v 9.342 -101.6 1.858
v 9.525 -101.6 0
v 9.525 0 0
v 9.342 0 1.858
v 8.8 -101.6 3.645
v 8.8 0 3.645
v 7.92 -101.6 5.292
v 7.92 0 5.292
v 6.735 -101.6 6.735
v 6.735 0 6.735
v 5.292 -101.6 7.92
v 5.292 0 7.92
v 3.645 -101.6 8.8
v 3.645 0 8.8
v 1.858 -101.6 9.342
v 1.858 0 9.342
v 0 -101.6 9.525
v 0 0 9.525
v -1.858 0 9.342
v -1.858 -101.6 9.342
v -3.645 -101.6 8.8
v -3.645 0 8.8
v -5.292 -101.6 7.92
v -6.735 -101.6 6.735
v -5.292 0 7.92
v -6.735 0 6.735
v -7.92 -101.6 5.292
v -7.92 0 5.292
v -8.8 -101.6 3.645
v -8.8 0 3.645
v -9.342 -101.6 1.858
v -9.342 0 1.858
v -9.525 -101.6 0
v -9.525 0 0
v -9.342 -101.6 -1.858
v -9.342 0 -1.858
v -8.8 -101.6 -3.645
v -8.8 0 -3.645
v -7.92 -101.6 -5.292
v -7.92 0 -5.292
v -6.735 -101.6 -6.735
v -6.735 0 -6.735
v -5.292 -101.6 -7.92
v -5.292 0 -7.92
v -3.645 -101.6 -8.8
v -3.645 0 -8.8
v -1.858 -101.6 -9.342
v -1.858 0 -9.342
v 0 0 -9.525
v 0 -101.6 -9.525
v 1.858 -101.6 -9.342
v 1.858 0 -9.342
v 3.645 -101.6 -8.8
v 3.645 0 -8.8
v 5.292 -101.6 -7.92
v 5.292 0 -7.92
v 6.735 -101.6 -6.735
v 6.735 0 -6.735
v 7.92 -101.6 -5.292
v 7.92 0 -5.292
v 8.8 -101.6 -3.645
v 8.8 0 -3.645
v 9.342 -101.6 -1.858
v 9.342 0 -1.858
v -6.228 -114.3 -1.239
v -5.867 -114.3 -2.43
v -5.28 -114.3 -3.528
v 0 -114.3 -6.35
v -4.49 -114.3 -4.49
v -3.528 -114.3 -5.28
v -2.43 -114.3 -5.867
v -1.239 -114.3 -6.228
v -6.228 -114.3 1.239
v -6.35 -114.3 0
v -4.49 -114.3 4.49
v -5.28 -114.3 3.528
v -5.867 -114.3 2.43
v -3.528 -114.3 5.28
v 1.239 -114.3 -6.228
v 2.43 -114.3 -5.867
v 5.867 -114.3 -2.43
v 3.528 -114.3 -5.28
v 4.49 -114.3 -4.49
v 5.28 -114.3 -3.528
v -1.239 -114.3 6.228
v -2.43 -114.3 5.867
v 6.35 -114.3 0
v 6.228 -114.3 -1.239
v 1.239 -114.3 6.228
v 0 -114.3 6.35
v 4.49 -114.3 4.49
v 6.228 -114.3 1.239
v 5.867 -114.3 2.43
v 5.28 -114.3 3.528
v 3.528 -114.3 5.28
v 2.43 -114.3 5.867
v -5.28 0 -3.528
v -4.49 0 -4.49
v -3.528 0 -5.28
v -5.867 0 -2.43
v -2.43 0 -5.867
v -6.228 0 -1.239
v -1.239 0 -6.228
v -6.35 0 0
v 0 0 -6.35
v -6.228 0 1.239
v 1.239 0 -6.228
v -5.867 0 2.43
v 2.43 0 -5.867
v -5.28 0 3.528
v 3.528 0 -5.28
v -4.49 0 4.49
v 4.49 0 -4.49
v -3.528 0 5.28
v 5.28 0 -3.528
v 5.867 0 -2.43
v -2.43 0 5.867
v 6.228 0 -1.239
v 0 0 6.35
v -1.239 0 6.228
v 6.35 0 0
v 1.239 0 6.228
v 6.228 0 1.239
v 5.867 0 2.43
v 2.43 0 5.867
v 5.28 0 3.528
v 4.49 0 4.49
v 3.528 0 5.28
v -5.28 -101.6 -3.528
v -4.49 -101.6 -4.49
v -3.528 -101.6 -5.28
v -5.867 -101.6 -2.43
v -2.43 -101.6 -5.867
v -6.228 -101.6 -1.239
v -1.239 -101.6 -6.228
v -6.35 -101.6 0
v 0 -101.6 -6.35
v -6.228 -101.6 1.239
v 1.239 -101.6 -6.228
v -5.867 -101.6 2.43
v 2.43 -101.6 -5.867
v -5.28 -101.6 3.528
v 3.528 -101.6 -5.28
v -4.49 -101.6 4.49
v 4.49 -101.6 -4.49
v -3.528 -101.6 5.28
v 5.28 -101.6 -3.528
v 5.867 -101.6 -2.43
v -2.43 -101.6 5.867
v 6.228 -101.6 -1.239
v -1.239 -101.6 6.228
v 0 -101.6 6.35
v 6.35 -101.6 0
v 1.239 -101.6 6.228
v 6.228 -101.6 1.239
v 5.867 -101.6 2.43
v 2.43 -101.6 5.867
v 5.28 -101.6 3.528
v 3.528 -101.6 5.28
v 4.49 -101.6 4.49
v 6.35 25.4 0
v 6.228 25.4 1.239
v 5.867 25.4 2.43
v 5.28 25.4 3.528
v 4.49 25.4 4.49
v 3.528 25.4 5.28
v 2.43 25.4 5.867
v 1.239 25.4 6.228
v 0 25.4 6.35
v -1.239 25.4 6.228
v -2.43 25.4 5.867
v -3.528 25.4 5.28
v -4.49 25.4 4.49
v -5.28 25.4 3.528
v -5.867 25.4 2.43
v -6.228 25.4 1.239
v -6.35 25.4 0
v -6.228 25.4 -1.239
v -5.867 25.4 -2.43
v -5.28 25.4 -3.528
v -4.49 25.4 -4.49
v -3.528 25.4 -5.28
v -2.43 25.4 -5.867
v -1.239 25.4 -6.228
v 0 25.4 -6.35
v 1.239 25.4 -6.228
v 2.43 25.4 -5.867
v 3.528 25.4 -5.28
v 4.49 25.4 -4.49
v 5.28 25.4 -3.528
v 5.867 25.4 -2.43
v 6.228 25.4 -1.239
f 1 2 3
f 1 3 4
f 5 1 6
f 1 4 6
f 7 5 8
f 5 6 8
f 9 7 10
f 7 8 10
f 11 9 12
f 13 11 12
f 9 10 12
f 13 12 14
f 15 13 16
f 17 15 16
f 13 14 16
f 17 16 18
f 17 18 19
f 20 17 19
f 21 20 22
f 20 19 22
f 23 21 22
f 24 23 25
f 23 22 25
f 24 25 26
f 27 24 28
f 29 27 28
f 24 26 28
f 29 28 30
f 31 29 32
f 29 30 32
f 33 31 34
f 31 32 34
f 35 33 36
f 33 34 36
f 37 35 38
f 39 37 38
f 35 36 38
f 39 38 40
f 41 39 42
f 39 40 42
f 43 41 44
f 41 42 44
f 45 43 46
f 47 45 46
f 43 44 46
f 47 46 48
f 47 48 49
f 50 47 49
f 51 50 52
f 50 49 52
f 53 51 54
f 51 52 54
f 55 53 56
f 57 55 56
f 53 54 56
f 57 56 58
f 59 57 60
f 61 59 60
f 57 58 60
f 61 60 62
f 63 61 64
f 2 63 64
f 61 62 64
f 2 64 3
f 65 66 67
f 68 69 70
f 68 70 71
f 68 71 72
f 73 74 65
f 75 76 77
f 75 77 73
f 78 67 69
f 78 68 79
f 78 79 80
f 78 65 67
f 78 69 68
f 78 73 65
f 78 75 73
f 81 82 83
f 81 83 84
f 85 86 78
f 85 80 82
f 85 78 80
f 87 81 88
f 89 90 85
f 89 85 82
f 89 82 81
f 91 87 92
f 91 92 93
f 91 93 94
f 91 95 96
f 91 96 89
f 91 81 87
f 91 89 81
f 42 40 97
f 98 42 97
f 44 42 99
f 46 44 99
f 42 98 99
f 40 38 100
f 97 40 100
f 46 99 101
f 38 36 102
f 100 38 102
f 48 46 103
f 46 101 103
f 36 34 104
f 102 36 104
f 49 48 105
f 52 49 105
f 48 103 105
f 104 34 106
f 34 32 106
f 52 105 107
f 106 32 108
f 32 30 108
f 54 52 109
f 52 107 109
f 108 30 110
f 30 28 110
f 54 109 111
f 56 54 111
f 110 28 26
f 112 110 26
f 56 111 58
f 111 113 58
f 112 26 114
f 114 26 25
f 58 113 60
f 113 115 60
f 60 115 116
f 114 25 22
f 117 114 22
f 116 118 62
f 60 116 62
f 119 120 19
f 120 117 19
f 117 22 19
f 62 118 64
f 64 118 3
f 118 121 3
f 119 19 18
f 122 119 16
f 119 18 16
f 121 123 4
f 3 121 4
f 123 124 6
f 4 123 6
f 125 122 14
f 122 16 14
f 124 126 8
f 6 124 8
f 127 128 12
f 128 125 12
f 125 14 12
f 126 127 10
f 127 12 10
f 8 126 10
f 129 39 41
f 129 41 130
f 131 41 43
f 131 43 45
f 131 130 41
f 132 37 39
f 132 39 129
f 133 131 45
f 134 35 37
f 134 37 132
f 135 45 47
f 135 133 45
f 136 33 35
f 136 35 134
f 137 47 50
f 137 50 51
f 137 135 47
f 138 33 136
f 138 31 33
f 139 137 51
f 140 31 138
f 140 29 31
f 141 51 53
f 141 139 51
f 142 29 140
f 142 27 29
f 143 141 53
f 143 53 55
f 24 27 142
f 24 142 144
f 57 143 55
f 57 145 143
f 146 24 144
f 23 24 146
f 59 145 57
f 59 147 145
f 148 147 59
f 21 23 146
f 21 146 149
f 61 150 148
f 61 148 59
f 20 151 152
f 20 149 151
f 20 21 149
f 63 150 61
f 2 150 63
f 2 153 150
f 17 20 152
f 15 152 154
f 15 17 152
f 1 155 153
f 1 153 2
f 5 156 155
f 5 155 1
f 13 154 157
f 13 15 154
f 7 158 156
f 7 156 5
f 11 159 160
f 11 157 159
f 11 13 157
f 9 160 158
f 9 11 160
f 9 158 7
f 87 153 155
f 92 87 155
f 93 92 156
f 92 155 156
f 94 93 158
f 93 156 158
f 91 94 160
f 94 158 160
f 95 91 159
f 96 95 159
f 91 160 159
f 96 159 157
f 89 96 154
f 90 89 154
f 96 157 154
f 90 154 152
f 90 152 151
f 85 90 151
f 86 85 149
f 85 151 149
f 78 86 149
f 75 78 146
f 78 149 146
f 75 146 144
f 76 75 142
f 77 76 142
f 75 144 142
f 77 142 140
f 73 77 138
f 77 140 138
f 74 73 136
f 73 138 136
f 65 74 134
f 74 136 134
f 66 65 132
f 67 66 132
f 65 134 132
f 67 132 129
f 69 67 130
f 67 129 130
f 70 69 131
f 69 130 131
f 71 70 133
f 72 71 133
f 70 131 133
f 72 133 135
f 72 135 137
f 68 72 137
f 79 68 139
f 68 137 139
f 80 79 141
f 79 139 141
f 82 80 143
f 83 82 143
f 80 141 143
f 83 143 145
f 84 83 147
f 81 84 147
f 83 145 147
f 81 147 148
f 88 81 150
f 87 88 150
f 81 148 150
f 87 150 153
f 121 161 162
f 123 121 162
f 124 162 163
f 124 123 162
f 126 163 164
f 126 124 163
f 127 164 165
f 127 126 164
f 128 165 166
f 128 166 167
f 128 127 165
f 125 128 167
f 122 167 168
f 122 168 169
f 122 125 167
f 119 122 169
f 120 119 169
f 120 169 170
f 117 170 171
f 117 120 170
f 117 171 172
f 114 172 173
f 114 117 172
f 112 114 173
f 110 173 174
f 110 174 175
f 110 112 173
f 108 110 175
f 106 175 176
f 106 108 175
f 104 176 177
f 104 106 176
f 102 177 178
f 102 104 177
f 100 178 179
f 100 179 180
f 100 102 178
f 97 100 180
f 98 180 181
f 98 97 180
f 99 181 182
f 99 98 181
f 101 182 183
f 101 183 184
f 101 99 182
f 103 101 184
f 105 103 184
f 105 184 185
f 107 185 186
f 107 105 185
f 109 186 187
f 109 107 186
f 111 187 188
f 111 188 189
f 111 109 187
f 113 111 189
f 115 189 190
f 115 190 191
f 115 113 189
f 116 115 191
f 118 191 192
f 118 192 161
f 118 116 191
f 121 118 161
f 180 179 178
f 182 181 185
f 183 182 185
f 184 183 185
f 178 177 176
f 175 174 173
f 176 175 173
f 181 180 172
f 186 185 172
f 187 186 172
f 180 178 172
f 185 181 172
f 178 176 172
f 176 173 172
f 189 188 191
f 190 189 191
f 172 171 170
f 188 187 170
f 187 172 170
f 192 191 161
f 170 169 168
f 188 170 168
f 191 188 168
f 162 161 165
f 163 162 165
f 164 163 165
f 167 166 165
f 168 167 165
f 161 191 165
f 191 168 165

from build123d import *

# Parameters (mm, degrees)
F0_R     = 9.525
F1_DEPTH = 101.6
F2_R     = 6.35
F3_DEPTH = 12.7
F4_R     = 6.35
F5_DEPTH = 25.4


with BuildPart() as f1:
    # F0 (on Front) → F1 (new body)
    with BuildSketch(Plane.XZ):
        Circle(F0_R)
    extrude(amount=F1_DEPTH)

    # F2 (on face) → F3 (join)
    with BuildSketch(Plane.XZ.offset(101.6)):
        Circle(F2_R)
    extrude(amount=F3_DEPTH)

    # F4 (on Front) → F5 (join)
    with BuildSketch(Plane.XZ):
        Circle(F4_R)
    extrude(amount=-F5_DEPTH)


solid = f1.part
